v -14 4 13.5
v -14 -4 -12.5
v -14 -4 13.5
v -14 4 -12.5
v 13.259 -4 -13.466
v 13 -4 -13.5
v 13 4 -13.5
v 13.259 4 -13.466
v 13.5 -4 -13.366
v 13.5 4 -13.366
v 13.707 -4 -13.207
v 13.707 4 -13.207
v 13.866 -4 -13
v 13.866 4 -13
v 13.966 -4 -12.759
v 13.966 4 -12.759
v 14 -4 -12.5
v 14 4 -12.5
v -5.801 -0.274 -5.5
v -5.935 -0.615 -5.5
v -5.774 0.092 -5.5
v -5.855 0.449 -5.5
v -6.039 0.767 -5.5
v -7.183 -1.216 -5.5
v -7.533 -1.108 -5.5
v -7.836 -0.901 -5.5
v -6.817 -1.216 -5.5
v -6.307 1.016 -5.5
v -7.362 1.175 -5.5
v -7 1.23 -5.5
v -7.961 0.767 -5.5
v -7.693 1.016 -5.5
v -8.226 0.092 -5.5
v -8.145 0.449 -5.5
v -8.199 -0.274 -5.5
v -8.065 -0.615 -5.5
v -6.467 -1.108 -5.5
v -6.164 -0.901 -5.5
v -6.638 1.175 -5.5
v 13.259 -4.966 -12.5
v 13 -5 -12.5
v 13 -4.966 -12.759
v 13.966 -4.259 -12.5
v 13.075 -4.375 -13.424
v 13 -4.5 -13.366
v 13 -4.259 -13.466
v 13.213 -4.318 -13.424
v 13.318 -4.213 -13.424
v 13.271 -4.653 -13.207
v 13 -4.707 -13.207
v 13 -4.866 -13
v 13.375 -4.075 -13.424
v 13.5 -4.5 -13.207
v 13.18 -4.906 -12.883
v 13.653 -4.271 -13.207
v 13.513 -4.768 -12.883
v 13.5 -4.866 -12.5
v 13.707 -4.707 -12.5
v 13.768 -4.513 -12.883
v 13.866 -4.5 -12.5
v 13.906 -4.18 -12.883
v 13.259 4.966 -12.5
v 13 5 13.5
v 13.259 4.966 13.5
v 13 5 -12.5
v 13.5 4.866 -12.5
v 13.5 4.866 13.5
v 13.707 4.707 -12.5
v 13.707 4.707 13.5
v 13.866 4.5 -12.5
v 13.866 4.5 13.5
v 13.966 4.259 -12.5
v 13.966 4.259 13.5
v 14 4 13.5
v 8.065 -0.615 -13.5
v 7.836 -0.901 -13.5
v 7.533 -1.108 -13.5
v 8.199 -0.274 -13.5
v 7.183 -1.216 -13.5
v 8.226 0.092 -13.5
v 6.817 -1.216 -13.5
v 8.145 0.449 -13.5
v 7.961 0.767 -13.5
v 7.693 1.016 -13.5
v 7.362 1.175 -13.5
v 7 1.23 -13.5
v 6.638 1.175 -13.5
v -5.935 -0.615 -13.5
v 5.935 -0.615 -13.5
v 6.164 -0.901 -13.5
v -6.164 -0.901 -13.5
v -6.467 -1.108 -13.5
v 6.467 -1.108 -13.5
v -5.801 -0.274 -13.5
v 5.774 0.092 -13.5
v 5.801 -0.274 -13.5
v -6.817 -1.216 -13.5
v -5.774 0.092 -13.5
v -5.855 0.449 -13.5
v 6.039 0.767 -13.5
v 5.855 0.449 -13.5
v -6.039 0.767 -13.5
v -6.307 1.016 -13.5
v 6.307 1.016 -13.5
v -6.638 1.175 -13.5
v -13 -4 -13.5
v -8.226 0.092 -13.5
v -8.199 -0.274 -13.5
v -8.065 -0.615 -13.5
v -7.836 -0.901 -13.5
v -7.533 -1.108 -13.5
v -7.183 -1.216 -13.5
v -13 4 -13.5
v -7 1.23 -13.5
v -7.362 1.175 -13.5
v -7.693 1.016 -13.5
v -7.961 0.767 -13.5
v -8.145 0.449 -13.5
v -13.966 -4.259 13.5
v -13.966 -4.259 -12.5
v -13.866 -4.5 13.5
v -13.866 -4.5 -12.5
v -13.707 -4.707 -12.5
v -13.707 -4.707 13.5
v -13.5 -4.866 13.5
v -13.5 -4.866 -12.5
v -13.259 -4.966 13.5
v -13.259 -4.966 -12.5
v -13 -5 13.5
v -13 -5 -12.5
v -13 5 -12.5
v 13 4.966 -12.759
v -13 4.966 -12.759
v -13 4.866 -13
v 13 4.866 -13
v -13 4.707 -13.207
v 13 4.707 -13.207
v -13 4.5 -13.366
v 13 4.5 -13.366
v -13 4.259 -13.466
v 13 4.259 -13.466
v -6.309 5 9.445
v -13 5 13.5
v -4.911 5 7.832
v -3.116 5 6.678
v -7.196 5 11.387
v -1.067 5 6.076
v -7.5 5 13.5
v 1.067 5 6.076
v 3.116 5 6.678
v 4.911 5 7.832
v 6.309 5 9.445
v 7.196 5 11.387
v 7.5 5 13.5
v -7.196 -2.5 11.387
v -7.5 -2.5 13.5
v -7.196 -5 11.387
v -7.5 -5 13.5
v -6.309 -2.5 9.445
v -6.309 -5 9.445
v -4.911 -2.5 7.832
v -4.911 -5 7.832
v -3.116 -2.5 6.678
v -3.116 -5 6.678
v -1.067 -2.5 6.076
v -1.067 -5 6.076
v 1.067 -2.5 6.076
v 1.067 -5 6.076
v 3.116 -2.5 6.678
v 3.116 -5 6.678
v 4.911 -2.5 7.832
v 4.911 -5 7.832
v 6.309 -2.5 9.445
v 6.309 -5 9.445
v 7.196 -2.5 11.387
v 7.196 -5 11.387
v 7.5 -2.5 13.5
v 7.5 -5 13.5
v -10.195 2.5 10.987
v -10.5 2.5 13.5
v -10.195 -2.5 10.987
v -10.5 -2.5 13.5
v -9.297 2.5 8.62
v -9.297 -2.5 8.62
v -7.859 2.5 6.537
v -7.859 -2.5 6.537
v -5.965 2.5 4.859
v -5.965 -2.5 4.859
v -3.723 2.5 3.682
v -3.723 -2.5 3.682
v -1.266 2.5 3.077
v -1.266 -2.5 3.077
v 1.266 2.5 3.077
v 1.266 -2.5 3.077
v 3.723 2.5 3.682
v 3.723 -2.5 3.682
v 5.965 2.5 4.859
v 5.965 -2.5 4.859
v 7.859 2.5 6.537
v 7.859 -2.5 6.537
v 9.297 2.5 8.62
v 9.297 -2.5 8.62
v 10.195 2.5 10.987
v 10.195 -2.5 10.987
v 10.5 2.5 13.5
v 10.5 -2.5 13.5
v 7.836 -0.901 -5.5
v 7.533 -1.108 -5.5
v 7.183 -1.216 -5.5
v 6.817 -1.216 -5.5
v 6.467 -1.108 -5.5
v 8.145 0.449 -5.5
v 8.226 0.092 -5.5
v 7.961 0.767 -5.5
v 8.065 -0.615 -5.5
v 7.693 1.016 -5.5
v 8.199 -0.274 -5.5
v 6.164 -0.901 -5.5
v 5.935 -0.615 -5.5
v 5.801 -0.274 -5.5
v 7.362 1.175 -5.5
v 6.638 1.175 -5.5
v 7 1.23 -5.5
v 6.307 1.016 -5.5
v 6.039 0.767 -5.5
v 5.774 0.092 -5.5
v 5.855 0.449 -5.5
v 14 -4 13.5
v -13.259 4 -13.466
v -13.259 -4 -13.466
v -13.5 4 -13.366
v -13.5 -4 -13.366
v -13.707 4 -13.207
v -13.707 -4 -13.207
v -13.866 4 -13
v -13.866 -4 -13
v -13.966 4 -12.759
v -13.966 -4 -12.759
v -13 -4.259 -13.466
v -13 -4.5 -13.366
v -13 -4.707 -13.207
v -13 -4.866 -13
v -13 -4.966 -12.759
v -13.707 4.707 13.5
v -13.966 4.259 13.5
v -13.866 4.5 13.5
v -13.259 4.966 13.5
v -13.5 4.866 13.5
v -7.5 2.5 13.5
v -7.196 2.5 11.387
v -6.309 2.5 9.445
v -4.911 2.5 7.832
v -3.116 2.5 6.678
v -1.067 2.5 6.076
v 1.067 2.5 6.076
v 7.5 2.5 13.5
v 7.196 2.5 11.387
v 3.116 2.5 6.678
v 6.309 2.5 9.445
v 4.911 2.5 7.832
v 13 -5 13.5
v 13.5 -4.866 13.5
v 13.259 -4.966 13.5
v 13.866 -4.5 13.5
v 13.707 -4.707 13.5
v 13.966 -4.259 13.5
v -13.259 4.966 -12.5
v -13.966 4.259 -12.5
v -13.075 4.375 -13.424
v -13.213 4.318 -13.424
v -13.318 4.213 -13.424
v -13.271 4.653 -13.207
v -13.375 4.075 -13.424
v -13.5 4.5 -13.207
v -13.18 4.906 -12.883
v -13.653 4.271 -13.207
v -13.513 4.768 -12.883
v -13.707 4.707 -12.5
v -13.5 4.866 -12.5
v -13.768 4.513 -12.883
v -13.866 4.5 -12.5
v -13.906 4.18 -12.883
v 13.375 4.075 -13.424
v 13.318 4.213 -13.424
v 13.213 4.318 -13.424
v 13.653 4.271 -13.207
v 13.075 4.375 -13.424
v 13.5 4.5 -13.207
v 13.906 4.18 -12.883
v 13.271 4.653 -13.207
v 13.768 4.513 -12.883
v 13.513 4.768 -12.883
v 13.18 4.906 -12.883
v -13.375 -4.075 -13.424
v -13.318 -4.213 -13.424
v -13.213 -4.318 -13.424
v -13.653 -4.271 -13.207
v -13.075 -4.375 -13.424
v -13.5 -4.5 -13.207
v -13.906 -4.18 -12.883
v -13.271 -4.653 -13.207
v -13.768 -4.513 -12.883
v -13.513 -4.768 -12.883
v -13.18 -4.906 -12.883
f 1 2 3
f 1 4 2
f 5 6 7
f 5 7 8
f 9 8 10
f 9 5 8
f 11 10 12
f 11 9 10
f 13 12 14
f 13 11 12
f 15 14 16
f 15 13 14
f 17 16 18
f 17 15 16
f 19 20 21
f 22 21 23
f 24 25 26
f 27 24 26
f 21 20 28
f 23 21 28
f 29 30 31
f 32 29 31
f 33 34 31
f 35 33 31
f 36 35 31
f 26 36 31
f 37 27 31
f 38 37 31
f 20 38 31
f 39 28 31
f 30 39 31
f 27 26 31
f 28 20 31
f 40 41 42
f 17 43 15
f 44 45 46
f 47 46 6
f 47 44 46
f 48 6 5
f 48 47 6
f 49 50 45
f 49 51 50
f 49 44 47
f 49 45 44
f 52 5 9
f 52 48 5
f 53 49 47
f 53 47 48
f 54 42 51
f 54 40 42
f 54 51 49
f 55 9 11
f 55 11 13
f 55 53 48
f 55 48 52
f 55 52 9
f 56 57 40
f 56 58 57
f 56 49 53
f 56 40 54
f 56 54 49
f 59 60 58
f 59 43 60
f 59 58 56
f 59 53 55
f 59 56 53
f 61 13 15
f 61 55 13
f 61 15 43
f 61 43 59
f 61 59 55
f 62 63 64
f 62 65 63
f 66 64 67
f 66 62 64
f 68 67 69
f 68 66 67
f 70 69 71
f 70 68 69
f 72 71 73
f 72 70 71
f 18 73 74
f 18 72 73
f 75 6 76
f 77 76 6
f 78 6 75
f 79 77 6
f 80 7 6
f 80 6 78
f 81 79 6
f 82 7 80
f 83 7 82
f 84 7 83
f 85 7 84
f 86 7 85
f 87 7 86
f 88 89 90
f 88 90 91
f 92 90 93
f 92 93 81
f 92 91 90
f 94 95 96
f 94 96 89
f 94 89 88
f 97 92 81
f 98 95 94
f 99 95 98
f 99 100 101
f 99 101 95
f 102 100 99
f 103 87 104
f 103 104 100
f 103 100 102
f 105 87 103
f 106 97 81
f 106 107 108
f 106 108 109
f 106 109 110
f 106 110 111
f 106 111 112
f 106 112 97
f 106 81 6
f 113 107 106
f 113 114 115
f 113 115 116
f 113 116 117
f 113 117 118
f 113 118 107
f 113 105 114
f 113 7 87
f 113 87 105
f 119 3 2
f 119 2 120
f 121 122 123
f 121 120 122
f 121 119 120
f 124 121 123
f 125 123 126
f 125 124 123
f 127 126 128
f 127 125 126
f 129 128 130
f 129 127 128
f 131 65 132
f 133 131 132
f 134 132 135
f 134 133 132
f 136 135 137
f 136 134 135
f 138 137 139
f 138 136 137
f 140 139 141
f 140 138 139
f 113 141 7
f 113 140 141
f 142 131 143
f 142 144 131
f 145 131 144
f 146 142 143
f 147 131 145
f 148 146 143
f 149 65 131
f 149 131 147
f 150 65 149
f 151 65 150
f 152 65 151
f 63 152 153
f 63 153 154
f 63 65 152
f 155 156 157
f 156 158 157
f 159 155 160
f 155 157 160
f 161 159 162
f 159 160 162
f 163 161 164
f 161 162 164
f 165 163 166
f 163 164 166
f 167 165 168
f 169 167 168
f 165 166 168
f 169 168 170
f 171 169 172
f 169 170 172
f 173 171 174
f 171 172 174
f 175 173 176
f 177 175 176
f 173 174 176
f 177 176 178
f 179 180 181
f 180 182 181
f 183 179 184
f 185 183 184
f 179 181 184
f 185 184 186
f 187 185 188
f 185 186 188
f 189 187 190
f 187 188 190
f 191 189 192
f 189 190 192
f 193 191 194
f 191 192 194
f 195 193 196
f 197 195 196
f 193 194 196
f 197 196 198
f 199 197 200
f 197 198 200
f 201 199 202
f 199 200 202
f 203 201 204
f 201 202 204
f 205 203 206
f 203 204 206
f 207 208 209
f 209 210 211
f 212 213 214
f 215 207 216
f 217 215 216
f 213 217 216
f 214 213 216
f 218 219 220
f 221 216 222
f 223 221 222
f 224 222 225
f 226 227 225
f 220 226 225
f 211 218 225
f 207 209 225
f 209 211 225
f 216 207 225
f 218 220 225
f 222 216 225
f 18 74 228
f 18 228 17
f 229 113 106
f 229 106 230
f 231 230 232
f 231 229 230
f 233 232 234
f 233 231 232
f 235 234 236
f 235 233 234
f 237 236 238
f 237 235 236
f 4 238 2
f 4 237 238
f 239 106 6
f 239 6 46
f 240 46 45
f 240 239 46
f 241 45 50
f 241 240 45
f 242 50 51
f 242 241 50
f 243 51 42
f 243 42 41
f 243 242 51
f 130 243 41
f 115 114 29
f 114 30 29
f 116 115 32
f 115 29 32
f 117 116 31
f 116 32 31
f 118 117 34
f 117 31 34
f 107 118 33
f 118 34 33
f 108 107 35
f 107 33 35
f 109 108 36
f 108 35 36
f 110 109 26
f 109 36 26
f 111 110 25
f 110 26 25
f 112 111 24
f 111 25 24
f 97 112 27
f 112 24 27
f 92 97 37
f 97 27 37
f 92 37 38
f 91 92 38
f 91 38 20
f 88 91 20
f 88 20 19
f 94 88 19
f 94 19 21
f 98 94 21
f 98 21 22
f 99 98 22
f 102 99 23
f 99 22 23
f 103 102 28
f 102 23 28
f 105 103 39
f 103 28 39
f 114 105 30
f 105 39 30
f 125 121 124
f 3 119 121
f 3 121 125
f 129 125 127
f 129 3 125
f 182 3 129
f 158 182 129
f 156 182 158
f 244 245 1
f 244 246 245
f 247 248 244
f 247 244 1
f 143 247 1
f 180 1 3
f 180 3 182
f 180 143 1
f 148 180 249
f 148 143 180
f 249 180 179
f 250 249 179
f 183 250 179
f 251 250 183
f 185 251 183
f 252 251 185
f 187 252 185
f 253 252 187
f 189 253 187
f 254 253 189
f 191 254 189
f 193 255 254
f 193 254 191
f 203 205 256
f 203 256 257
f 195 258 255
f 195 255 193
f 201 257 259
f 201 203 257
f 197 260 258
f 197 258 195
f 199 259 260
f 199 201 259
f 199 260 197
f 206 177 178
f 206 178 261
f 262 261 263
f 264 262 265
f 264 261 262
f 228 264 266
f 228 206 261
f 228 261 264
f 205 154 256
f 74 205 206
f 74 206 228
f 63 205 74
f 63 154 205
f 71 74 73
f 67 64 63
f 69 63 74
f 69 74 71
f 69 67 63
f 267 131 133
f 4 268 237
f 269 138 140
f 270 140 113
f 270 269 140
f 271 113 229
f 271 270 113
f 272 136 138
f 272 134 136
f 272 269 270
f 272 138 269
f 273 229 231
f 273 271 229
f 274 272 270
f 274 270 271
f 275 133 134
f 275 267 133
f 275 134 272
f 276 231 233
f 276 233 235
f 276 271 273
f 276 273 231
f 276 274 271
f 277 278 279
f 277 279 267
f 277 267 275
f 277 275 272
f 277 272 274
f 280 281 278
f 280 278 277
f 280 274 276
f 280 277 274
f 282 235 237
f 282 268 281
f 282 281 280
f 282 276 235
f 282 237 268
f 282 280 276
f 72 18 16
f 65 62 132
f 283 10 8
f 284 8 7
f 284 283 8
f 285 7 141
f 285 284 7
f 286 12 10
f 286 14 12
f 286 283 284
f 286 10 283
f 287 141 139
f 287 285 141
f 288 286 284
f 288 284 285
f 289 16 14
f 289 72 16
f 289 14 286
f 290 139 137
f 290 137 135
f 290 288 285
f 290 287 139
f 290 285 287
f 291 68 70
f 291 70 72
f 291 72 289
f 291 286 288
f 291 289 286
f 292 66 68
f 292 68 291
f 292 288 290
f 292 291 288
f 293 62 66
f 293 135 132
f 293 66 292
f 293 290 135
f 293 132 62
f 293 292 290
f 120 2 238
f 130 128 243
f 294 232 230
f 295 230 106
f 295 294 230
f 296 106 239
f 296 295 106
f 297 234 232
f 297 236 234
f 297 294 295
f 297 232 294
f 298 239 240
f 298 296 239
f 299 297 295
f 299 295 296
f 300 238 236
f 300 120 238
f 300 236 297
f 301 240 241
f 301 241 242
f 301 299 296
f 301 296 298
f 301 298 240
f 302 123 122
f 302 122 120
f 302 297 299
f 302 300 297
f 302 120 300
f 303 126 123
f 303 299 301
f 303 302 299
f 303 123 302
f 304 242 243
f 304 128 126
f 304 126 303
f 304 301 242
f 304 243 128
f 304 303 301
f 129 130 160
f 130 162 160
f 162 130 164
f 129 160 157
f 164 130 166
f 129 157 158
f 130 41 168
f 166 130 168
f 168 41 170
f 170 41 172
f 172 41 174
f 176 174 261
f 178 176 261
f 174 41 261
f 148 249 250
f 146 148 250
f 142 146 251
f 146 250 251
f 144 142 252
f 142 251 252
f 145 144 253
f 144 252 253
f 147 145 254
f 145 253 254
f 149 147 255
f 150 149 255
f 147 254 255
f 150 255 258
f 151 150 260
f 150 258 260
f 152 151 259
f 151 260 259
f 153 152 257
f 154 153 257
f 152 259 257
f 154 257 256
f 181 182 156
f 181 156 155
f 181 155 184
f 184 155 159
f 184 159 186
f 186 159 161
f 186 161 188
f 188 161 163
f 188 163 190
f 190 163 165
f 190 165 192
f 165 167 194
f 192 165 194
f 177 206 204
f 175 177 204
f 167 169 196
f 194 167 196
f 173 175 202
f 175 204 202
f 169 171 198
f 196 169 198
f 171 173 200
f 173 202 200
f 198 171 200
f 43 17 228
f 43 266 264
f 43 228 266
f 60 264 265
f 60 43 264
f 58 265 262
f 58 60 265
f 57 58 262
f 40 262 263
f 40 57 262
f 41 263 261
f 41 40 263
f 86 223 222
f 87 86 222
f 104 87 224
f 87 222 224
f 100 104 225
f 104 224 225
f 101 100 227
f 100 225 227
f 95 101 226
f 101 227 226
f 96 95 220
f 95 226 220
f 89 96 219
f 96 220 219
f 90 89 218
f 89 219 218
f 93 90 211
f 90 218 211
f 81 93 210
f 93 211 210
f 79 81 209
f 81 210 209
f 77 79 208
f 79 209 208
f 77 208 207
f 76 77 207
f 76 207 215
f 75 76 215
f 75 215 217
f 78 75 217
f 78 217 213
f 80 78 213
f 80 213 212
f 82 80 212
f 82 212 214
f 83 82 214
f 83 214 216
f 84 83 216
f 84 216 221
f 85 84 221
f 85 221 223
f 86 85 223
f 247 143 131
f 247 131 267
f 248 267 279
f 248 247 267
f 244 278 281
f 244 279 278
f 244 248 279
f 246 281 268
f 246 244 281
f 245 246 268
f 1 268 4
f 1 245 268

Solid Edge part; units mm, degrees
sketch "Sketch1" plane through (0, 0, 0) normal (0, -1, 0) x (1, 0, 0)
  line L0 (14, -13.5) -> (-14, -13.5)
  line L1 (-14, -13.5) -> (-14, 13.5)
  line L2 (-14, 13.5) -> (14, 13.5)
  line L3 (14, 13.5) -> (14, -13.5)
  dimension "D1" = 28
  dimension "D2" = 27
extrude "Protrusion1" add sketch "Sketch1" along normal mid plane 10
sketch "Sketch2" plane through (0, -2.5, 0) normal (0, -1, 0) x (1, 0, 0)
  circle A0 centre (0, 13.5) radius 10.5
extrude "Extrusionsausschnitt_1" cut sketch "Sketch2" against normal blind 5
fillet "Verrundung_1" radius 1 8 edges at (-14, -5, 0) (14, -5, 0) (-14, 5, 0) (14, 5, 0) (0, -5, -13.5) (-14, 0, -13.5) (0, 5, -13.5) (14, 0, -13.5)
sketch "Sketch3" plane through (0, -5, 0.5) normal (0, -1, 0) x (1, 0, 0)
  circle A0 centre (0, 13) radius 7.5
  dimension "D1" = 15
extrude "Extrusionsausschnitt_2" cut sketch "Sketch3" against normal blind 19.0261
hole "Bohrung_1" at (-7, 0, -13.5) direction (0, 0, 1) diameter 2.459 depth 8
hole "Hole1" at (7, 0, -13.5) direction (0, 0, 1) diameter 2.459 depth 8
properties part number "037" material "PLA"
